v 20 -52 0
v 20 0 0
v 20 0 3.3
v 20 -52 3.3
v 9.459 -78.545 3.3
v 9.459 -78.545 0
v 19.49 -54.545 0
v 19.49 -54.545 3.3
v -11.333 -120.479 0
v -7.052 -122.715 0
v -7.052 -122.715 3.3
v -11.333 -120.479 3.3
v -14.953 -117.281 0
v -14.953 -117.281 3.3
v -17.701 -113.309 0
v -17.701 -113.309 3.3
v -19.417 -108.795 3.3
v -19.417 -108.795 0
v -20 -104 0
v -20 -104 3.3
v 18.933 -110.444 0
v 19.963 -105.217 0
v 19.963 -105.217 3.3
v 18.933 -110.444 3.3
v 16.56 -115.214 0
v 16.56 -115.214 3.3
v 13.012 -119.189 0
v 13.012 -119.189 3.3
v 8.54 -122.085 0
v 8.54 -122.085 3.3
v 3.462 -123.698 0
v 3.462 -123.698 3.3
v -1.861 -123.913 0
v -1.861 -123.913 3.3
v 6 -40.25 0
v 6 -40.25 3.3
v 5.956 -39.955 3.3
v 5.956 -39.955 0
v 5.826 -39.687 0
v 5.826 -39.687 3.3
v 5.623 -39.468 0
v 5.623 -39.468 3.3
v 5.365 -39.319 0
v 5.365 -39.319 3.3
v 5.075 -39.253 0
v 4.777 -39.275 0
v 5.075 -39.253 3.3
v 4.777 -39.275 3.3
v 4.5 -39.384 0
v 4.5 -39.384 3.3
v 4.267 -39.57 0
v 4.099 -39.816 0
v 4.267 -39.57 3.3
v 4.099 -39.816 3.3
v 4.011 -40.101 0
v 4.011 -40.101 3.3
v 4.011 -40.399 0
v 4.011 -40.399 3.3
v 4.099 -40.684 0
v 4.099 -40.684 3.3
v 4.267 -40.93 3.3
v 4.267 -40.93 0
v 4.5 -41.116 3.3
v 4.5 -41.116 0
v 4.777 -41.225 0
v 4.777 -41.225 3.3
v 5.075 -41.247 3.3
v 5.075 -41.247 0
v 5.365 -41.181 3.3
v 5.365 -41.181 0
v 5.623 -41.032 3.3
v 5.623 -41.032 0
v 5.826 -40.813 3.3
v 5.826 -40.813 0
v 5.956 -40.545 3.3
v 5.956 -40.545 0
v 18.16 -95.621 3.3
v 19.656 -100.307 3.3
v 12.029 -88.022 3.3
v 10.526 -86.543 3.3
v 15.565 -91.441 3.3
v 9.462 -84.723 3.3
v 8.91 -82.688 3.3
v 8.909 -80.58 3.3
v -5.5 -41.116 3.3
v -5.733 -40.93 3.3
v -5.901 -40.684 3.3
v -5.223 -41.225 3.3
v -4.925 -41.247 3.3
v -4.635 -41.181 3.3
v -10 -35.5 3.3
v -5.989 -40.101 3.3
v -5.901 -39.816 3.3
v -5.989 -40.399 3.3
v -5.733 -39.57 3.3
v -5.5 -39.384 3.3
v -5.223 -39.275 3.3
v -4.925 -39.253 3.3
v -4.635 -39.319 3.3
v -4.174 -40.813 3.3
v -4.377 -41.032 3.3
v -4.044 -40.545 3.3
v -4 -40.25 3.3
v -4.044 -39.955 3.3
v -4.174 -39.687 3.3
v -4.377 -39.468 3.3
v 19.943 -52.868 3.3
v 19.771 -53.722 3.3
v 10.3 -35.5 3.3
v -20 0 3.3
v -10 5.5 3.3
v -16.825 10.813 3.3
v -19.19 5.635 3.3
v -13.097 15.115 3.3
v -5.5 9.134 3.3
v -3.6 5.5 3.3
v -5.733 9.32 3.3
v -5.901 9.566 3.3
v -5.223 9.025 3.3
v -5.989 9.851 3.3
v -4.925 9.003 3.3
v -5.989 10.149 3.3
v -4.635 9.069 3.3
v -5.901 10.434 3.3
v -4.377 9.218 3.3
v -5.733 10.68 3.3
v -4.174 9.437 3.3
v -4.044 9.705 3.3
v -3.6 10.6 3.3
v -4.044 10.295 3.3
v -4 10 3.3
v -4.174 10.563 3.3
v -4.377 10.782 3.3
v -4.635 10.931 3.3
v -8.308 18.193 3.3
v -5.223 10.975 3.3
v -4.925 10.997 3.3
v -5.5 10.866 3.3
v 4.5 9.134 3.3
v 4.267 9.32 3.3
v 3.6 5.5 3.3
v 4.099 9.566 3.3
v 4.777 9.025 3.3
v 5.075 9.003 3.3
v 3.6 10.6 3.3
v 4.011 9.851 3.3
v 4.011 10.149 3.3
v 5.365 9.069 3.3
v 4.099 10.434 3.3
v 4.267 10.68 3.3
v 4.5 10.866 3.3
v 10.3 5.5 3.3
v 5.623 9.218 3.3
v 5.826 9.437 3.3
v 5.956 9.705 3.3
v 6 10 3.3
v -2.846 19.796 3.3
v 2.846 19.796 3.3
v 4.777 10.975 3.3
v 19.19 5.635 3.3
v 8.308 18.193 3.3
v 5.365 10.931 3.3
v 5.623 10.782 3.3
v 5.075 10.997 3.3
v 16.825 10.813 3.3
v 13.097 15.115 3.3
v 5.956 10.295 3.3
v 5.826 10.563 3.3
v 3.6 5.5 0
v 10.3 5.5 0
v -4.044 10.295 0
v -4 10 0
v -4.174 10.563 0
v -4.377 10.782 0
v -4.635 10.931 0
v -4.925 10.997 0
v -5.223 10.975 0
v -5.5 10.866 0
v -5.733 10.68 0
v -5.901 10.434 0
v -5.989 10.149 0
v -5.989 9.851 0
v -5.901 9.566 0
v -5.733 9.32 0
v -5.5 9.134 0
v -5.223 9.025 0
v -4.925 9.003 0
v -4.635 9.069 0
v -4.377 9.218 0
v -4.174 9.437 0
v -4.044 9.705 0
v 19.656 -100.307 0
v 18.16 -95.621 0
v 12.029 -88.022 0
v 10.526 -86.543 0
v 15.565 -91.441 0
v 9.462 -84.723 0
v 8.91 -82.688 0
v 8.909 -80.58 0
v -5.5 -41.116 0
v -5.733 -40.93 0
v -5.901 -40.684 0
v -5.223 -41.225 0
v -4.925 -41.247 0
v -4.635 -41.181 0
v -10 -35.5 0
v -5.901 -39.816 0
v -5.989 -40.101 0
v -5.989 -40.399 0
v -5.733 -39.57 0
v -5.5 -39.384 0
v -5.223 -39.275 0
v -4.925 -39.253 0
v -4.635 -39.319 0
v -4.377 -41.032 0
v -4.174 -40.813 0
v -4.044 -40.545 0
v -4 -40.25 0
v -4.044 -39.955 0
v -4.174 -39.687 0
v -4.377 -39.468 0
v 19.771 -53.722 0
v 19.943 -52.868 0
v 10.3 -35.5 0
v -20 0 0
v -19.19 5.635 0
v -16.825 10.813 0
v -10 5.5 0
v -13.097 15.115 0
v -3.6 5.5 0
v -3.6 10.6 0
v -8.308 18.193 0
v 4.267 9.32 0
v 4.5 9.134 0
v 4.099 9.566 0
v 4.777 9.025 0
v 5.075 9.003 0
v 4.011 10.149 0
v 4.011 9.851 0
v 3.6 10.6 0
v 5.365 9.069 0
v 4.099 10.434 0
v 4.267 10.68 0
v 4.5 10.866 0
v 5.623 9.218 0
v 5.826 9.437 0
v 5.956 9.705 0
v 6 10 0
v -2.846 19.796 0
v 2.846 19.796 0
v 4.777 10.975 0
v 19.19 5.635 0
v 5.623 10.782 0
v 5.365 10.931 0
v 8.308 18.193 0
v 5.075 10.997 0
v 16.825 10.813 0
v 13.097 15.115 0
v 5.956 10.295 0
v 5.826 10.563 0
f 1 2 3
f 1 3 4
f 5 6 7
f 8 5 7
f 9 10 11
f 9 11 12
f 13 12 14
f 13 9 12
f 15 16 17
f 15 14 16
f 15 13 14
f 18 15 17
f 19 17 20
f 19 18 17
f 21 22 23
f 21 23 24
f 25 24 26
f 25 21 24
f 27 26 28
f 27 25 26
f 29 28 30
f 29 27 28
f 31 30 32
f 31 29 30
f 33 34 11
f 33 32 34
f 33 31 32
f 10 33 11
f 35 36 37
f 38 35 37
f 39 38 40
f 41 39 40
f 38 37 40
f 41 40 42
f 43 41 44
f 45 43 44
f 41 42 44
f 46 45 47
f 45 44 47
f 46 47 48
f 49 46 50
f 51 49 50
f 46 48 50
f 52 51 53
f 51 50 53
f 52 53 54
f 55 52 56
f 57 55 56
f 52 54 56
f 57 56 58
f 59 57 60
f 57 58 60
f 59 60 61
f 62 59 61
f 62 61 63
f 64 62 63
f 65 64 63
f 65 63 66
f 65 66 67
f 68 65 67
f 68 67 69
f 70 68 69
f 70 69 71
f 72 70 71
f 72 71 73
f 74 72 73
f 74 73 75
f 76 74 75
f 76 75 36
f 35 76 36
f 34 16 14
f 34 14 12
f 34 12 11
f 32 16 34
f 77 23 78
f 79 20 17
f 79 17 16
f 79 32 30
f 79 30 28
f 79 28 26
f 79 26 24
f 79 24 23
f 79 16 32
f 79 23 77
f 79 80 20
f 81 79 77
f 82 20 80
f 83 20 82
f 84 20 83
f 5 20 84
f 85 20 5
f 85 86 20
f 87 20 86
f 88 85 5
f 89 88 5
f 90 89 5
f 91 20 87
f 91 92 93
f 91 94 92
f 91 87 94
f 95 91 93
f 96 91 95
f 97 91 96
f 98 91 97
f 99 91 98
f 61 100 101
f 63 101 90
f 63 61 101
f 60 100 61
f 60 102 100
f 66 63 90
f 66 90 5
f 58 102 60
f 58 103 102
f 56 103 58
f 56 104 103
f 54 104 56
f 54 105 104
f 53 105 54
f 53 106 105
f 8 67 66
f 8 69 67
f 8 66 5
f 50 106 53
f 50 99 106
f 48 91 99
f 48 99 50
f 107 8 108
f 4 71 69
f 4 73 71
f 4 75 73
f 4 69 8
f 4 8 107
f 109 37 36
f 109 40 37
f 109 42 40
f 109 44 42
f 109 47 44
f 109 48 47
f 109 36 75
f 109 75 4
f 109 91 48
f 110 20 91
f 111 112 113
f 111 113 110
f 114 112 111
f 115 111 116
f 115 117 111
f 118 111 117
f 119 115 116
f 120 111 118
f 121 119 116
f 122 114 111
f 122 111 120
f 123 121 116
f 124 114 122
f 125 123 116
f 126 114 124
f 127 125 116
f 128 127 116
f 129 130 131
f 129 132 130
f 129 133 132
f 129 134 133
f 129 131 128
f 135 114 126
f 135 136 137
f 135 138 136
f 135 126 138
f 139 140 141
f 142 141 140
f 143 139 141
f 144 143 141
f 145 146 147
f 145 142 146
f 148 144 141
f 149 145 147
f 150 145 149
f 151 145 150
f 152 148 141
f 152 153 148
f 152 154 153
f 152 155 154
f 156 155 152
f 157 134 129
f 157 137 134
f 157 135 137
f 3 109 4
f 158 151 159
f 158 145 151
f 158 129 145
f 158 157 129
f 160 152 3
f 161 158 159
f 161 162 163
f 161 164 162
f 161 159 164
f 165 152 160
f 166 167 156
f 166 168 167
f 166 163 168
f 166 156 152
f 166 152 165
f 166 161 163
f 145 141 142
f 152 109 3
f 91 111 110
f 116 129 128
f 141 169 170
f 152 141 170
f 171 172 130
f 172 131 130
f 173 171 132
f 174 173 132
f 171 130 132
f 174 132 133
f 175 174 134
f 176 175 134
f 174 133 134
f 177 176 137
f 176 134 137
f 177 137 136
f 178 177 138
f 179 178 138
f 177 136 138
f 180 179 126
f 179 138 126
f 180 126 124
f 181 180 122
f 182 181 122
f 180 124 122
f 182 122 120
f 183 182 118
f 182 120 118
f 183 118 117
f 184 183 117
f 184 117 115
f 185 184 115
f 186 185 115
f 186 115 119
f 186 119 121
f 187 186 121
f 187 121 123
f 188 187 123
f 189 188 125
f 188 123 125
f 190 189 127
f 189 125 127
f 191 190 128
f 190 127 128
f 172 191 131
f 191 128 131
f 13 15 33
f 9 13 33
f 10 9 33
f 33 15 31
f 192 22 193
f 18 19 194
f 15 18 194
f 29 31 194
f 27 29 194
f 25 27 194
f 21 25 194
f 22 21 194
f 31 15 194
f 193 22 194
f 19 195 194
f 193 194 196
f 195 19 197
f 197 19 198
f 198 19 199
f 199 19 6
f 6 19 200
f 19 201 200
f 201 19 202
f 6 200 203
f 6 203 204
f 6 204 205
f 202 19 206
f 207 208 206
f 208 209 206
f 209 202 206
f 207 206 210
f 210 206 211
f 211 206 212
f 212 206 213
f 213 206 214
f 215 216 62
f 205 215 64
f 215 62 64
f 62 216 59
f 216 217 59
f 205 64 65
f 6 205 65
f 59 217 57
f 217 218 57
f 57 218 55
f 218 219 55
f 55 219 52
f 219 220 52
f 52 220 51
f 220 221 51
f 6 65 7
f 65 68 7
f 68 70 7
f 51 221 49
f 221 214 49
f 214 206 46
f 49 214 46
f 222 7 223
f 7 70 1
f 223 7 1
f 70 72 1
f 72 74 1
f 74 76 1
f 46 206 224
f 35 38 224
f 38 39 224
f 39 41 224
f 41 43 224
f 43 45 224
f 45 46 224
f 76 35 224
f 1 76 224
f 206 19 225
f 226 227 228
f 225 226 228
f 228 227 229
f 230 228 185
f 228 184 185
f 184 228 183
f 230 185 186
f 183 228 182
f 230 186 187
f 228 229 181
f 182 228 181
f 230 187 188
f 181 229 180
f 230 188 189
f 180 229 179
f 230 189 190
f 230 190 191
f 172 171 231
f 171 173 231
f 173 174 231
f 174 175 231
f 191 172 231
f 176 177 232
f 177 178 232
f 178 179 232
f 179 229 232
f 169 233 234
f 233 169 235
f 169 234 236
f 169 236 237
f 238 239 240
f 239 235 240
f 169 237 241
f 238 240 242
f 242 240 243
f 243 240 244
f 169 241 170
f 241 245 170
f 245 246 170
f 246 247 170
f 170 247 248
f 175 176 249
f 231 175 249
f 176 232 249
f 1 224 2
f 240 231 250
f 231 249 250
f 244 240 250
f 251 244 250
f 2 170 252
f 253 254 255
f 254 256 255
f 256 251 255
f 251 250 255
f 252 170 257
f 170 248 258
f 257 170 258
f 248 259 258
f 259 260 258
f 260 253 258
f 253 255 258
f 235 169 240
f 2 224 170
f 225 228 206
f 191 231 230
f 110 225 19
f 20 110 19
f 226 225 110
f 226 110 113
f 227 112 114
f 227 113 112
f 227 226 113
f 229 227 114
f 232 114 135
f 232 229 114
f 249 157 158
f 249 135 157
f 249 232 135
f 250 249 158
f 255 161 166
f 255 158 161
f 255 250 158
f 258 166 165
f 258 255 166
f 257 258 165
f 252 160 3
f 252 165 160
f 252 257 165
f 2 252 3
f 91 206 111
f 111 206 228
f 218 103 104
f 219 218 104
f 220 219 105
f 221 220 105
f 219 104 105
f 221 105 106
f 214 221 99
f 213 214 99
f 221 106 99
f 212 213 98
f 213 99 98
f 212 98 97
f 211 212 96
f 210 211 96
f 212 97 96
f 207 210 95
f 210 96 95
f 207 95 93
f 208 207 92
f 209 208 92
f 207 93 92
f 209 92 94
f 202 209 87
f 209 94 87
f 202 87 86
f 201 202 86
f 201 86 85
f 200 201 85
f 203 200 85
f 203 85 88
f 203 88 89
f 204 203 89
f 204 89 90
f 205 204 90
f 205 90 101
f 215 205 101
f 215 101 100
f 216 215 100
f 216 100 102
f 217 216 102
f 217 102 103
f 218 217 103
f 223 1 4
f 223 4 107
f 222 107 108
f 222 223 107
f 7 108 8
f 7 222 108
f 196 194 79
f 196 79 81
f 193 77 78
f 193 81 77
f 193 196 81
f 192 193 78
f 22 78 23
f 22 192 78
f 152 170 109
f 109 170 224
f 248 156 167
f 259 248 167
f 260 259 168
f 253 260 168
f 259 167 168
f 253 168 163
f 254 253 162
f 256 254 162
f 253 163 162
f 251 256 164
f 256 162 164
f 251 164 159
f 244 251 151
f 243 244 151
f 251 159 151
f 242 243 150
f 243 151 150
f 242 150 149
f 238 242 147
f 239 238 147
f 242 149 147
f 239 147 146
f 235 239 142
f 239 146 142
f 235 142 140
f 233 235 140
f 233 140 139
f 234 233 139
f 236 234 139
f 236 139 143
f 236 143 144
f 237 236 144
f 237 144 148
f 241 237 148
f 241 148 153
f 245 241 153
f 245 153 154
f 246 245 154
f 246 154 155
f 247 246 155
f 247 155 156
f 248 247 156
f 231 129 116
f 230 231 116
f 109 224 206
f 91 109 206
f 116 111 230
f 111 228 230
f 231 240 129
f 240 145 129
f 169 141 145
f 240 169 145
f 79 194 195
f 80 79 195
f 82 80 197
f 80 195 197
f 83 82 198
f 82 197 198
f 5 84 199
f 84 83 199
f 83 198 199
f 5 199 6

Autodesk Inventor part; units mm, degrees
ref_plane "YZ Plane" through (0, 0, 0) normal (1, 0, 0) x (0, 1, 0)
ref_plane "XZ Plane" through (0, 0, 0) normal (0, 1, 0) x (-1, 0, 0)
ref_plane "XY Plane" through (0, 0, 0) normal (0, 0, 1) x (1, 0, 0)
sketch "Sketch1" plane through (0, 0, 0) normal (0, 0, 1) x (1, 0, 0)
  arc A0 (20, 0) -> (-20, 0) centre (0, 0) ccw
  line L0 (-20, 0) -> (-20, -104)
  line L1 (20, 0) -> (20, -52)
  arc A1 (19.4895, -54.5451) -> (20, -52) centre (13.4, -52) ccw
  arc A2 (-20, -104) -> (-7.0525, -122.7153) centre (0, -104) ccw
  arc A3 (-7.0525, -122.7153) -> (19.963, -105.2168) centre (0, -104) ccw
  arc A4 (19.963, -105.2168) -> (12.0286, -88.0215) centre (0, -104) ccw
  arc A5 (9.4588, -78.5451) -> (12.0286, -88.0215) centre (16.84, -81.6301) ccw
  line L2 (9.4588, -78.5451) -> (19.4895, -54.5451)
  line L3 (-10, 5.5) -> (10.3, 5.5)
  line L4 (10.3, 5.5) -> (10.3, -35.5)
  line L5 (10.3, -35.5) -> (-10, -35.5)
  line L6 (-10, -35.5) -> (-10, 5.5)
  dimension "d3" = 20
  dimension "d5" = 52
  dimension "d6" = 20
  dimension "d7" = 20
  dimension "d8" = 8
  dimension "d10" = 6.6
  dimension "d11" = 24
  dimension "d17" = 20.3
  dimension "d18" = 41
  dimension "d19" = 10
  dimension "d20" = 104
  dimension "d30" = 5.5
extrude "Extrusion1" add sketch "Sketch1" along normal blind 3.3
sketch "Sketch2" plane through (0, 0, 3.3) normal (0, 0, 1) x (1, 0, 0)
  line L0 (-10, 5.5) -> (10.3, 5.5) projected
  line L1 (10.3, -35.5) -> (-10, -35.5) projected
  circle A0 centre (-5, 10) radius 1
  circle A1 centre (-5, -40.25) radius 1
  line L2 (-10, -35.5) -> (-10, 5.5) projected
  line L3 (10.3, 5.5) -> (10.3, -35.5) projected
  circle A2 centre (5, 10) radius 1
  circle A3 centre (5, -40.25) radius 1
  point P0 (0, 0)
  dimension "d31" = 2
  dimension "d32" = 2
  dimension "d34" = 4.5
  dimension "d36" = 4.75
  dimension "d65" = 5
  dimension "d66" = 10
  dimension "d67" = 5
  dimension "d68" = 10
extrude "Extrusion2" cut sketch "Sketch2" against normal blind 4.5 contours A0 | A1 | A2 | A3
sketch "Sketch3" plane through (0, 0, 3.3) normal (0, 0, 1) x (1, 0, 0)
  line L0 (-20, 0) -> (-20, -104) projected
  line L1 (10.3, 5.5) -> (10.3, -35.5) projected
  line L2 (10.3, -35.5) -> (-10, -35.5) projected
  line L3 (-10, -35.5) -> (-10, 5.5) projected
  line L4 (-10, 5.5) -> (10.3, 5.5) projected
  line L5 (-20, 0) -> (-20, -104) projected
  arc A0 (-20, -104) -> (12.0286, -88.0215) centre (0, -104) ccw projected
  arc A1 (9.4588, -78.5451) -> (12.0286, -88.0215) centre (16.84, -81.6301) ccw projected
  line L6 (9.4588, -78.5451) -> (19.4895, -54.5451) projected
  arc A2 (19.4895, -54.5451) -> (20, -52) centre (13.4, -52) ccw projected
  line L7 (20, -52) -> (20, 0) projected
  arc A3 (20, 0) -> (-20, 0) centre (0, 0) ccw projected
  line L8 (-15, -86) -> (-15, -56)
  line L9 (15, -45.2979) -> (15, -53.2979)
  line L10 (15, -53.2979) -> (4.448, -78.5451)
  line L11 (4.448, -78.5451) -> (-15, -86)
  line L12 (9.4588, -78.5451) -> (19.4895, -54.5451) projected
  line L13 (-15, -94.5676) -> (-15, -104)
  arc A4 (-15, -104) -> (9.0215, -92.0161) centre (0, -104) ccw
  arc A5 (-20, -104) -> (12.0286, -88.0215) centre (0, -104) ccw projected
  arc A6 (4.9629, -86.9153) -> (9.0215, -92.0161) centre (16.84, -81.6301) ccw
  arc A7 (9.4588, -78.5451) -> (12.0286, -88.0215) centre (16.84, -81.6301) ccw projected
  line L14 (4.9629, -86.9153) -> (-15, -94.5676)
  line L15 (-15, -56) -> (15, -45.2979)
  line L16 (-15, -50.6914) -> (15, -39.9893)
  line L17 (15, -39.9893) -> (15, -36.8041)
  line L18 (15, -36.8041) -> (-15, -47.5062)
  line L19 (-15, -47.5062) -> (-15, -50.6914)
  point P0 (19.8711, -53.2979)
  dimension "d45" = 5
  dimension "d46" = 5
  dimension "d48" = 8
  dimension "d49" = 18
  dimension "d52" = 5
  dimension "d54" = 3
  dimension "d56" = 30
  dimension "d57" = 8
sketch "Sketch4" plane through (0, 0, 3.3) normal (0, 0, 1) x (1, 0, 0)
  line L0 (10.3, 5.5) -> (-10, 5.5) projected
  line L1 (-3.6, 5.5) -> (3.6, 5.5)
  line L2 (3.6, 5.5) -> (3.6, 10.6)
  line L3 (3.6, 10.6) -> (-3.6, 10.6)
  line L4 (-3.6, 10.6) -> (-3.6, 5.5)
  line L5 (-10, -35.5) -> (-10, 5.5) projected
  line L6 (10.3, 5.5) -> (10.3, -35.5) projected
  point P0 (0, 0)
  dimension "d71" = 5.1
  dimension "d72" = 7.2
  dimension "d73" = 6.4
extrude "Extrusion6" cut sketch "Sketch4" against normal blind 10
equation "\"d3\" = radio_muslo"
equation "\"d6\" = radio_muslo"
equation "\"d7\" = d6"
equation "\"d19\" = 0.5 * base_servo"
equation "\"d20\" = 2 * d5"
equation "\"d22\" = espesor"
equation "\"d31\" = agujero_servo"
equation "\"d32\" = agujero_servo"
equation "\"d36\" = distancia_agujero_servo"
equation "\"espesor\" = 3.3"
equation "\"radio_muslo\" = 20"
equation "\"agujero_servo\" = 2"
equation "\"distancia_agujero_servo\" = 4.75"
equation "\"base_servo\" = 20"
properties part number "Pata - Brazo" material "ABS Plastic"
